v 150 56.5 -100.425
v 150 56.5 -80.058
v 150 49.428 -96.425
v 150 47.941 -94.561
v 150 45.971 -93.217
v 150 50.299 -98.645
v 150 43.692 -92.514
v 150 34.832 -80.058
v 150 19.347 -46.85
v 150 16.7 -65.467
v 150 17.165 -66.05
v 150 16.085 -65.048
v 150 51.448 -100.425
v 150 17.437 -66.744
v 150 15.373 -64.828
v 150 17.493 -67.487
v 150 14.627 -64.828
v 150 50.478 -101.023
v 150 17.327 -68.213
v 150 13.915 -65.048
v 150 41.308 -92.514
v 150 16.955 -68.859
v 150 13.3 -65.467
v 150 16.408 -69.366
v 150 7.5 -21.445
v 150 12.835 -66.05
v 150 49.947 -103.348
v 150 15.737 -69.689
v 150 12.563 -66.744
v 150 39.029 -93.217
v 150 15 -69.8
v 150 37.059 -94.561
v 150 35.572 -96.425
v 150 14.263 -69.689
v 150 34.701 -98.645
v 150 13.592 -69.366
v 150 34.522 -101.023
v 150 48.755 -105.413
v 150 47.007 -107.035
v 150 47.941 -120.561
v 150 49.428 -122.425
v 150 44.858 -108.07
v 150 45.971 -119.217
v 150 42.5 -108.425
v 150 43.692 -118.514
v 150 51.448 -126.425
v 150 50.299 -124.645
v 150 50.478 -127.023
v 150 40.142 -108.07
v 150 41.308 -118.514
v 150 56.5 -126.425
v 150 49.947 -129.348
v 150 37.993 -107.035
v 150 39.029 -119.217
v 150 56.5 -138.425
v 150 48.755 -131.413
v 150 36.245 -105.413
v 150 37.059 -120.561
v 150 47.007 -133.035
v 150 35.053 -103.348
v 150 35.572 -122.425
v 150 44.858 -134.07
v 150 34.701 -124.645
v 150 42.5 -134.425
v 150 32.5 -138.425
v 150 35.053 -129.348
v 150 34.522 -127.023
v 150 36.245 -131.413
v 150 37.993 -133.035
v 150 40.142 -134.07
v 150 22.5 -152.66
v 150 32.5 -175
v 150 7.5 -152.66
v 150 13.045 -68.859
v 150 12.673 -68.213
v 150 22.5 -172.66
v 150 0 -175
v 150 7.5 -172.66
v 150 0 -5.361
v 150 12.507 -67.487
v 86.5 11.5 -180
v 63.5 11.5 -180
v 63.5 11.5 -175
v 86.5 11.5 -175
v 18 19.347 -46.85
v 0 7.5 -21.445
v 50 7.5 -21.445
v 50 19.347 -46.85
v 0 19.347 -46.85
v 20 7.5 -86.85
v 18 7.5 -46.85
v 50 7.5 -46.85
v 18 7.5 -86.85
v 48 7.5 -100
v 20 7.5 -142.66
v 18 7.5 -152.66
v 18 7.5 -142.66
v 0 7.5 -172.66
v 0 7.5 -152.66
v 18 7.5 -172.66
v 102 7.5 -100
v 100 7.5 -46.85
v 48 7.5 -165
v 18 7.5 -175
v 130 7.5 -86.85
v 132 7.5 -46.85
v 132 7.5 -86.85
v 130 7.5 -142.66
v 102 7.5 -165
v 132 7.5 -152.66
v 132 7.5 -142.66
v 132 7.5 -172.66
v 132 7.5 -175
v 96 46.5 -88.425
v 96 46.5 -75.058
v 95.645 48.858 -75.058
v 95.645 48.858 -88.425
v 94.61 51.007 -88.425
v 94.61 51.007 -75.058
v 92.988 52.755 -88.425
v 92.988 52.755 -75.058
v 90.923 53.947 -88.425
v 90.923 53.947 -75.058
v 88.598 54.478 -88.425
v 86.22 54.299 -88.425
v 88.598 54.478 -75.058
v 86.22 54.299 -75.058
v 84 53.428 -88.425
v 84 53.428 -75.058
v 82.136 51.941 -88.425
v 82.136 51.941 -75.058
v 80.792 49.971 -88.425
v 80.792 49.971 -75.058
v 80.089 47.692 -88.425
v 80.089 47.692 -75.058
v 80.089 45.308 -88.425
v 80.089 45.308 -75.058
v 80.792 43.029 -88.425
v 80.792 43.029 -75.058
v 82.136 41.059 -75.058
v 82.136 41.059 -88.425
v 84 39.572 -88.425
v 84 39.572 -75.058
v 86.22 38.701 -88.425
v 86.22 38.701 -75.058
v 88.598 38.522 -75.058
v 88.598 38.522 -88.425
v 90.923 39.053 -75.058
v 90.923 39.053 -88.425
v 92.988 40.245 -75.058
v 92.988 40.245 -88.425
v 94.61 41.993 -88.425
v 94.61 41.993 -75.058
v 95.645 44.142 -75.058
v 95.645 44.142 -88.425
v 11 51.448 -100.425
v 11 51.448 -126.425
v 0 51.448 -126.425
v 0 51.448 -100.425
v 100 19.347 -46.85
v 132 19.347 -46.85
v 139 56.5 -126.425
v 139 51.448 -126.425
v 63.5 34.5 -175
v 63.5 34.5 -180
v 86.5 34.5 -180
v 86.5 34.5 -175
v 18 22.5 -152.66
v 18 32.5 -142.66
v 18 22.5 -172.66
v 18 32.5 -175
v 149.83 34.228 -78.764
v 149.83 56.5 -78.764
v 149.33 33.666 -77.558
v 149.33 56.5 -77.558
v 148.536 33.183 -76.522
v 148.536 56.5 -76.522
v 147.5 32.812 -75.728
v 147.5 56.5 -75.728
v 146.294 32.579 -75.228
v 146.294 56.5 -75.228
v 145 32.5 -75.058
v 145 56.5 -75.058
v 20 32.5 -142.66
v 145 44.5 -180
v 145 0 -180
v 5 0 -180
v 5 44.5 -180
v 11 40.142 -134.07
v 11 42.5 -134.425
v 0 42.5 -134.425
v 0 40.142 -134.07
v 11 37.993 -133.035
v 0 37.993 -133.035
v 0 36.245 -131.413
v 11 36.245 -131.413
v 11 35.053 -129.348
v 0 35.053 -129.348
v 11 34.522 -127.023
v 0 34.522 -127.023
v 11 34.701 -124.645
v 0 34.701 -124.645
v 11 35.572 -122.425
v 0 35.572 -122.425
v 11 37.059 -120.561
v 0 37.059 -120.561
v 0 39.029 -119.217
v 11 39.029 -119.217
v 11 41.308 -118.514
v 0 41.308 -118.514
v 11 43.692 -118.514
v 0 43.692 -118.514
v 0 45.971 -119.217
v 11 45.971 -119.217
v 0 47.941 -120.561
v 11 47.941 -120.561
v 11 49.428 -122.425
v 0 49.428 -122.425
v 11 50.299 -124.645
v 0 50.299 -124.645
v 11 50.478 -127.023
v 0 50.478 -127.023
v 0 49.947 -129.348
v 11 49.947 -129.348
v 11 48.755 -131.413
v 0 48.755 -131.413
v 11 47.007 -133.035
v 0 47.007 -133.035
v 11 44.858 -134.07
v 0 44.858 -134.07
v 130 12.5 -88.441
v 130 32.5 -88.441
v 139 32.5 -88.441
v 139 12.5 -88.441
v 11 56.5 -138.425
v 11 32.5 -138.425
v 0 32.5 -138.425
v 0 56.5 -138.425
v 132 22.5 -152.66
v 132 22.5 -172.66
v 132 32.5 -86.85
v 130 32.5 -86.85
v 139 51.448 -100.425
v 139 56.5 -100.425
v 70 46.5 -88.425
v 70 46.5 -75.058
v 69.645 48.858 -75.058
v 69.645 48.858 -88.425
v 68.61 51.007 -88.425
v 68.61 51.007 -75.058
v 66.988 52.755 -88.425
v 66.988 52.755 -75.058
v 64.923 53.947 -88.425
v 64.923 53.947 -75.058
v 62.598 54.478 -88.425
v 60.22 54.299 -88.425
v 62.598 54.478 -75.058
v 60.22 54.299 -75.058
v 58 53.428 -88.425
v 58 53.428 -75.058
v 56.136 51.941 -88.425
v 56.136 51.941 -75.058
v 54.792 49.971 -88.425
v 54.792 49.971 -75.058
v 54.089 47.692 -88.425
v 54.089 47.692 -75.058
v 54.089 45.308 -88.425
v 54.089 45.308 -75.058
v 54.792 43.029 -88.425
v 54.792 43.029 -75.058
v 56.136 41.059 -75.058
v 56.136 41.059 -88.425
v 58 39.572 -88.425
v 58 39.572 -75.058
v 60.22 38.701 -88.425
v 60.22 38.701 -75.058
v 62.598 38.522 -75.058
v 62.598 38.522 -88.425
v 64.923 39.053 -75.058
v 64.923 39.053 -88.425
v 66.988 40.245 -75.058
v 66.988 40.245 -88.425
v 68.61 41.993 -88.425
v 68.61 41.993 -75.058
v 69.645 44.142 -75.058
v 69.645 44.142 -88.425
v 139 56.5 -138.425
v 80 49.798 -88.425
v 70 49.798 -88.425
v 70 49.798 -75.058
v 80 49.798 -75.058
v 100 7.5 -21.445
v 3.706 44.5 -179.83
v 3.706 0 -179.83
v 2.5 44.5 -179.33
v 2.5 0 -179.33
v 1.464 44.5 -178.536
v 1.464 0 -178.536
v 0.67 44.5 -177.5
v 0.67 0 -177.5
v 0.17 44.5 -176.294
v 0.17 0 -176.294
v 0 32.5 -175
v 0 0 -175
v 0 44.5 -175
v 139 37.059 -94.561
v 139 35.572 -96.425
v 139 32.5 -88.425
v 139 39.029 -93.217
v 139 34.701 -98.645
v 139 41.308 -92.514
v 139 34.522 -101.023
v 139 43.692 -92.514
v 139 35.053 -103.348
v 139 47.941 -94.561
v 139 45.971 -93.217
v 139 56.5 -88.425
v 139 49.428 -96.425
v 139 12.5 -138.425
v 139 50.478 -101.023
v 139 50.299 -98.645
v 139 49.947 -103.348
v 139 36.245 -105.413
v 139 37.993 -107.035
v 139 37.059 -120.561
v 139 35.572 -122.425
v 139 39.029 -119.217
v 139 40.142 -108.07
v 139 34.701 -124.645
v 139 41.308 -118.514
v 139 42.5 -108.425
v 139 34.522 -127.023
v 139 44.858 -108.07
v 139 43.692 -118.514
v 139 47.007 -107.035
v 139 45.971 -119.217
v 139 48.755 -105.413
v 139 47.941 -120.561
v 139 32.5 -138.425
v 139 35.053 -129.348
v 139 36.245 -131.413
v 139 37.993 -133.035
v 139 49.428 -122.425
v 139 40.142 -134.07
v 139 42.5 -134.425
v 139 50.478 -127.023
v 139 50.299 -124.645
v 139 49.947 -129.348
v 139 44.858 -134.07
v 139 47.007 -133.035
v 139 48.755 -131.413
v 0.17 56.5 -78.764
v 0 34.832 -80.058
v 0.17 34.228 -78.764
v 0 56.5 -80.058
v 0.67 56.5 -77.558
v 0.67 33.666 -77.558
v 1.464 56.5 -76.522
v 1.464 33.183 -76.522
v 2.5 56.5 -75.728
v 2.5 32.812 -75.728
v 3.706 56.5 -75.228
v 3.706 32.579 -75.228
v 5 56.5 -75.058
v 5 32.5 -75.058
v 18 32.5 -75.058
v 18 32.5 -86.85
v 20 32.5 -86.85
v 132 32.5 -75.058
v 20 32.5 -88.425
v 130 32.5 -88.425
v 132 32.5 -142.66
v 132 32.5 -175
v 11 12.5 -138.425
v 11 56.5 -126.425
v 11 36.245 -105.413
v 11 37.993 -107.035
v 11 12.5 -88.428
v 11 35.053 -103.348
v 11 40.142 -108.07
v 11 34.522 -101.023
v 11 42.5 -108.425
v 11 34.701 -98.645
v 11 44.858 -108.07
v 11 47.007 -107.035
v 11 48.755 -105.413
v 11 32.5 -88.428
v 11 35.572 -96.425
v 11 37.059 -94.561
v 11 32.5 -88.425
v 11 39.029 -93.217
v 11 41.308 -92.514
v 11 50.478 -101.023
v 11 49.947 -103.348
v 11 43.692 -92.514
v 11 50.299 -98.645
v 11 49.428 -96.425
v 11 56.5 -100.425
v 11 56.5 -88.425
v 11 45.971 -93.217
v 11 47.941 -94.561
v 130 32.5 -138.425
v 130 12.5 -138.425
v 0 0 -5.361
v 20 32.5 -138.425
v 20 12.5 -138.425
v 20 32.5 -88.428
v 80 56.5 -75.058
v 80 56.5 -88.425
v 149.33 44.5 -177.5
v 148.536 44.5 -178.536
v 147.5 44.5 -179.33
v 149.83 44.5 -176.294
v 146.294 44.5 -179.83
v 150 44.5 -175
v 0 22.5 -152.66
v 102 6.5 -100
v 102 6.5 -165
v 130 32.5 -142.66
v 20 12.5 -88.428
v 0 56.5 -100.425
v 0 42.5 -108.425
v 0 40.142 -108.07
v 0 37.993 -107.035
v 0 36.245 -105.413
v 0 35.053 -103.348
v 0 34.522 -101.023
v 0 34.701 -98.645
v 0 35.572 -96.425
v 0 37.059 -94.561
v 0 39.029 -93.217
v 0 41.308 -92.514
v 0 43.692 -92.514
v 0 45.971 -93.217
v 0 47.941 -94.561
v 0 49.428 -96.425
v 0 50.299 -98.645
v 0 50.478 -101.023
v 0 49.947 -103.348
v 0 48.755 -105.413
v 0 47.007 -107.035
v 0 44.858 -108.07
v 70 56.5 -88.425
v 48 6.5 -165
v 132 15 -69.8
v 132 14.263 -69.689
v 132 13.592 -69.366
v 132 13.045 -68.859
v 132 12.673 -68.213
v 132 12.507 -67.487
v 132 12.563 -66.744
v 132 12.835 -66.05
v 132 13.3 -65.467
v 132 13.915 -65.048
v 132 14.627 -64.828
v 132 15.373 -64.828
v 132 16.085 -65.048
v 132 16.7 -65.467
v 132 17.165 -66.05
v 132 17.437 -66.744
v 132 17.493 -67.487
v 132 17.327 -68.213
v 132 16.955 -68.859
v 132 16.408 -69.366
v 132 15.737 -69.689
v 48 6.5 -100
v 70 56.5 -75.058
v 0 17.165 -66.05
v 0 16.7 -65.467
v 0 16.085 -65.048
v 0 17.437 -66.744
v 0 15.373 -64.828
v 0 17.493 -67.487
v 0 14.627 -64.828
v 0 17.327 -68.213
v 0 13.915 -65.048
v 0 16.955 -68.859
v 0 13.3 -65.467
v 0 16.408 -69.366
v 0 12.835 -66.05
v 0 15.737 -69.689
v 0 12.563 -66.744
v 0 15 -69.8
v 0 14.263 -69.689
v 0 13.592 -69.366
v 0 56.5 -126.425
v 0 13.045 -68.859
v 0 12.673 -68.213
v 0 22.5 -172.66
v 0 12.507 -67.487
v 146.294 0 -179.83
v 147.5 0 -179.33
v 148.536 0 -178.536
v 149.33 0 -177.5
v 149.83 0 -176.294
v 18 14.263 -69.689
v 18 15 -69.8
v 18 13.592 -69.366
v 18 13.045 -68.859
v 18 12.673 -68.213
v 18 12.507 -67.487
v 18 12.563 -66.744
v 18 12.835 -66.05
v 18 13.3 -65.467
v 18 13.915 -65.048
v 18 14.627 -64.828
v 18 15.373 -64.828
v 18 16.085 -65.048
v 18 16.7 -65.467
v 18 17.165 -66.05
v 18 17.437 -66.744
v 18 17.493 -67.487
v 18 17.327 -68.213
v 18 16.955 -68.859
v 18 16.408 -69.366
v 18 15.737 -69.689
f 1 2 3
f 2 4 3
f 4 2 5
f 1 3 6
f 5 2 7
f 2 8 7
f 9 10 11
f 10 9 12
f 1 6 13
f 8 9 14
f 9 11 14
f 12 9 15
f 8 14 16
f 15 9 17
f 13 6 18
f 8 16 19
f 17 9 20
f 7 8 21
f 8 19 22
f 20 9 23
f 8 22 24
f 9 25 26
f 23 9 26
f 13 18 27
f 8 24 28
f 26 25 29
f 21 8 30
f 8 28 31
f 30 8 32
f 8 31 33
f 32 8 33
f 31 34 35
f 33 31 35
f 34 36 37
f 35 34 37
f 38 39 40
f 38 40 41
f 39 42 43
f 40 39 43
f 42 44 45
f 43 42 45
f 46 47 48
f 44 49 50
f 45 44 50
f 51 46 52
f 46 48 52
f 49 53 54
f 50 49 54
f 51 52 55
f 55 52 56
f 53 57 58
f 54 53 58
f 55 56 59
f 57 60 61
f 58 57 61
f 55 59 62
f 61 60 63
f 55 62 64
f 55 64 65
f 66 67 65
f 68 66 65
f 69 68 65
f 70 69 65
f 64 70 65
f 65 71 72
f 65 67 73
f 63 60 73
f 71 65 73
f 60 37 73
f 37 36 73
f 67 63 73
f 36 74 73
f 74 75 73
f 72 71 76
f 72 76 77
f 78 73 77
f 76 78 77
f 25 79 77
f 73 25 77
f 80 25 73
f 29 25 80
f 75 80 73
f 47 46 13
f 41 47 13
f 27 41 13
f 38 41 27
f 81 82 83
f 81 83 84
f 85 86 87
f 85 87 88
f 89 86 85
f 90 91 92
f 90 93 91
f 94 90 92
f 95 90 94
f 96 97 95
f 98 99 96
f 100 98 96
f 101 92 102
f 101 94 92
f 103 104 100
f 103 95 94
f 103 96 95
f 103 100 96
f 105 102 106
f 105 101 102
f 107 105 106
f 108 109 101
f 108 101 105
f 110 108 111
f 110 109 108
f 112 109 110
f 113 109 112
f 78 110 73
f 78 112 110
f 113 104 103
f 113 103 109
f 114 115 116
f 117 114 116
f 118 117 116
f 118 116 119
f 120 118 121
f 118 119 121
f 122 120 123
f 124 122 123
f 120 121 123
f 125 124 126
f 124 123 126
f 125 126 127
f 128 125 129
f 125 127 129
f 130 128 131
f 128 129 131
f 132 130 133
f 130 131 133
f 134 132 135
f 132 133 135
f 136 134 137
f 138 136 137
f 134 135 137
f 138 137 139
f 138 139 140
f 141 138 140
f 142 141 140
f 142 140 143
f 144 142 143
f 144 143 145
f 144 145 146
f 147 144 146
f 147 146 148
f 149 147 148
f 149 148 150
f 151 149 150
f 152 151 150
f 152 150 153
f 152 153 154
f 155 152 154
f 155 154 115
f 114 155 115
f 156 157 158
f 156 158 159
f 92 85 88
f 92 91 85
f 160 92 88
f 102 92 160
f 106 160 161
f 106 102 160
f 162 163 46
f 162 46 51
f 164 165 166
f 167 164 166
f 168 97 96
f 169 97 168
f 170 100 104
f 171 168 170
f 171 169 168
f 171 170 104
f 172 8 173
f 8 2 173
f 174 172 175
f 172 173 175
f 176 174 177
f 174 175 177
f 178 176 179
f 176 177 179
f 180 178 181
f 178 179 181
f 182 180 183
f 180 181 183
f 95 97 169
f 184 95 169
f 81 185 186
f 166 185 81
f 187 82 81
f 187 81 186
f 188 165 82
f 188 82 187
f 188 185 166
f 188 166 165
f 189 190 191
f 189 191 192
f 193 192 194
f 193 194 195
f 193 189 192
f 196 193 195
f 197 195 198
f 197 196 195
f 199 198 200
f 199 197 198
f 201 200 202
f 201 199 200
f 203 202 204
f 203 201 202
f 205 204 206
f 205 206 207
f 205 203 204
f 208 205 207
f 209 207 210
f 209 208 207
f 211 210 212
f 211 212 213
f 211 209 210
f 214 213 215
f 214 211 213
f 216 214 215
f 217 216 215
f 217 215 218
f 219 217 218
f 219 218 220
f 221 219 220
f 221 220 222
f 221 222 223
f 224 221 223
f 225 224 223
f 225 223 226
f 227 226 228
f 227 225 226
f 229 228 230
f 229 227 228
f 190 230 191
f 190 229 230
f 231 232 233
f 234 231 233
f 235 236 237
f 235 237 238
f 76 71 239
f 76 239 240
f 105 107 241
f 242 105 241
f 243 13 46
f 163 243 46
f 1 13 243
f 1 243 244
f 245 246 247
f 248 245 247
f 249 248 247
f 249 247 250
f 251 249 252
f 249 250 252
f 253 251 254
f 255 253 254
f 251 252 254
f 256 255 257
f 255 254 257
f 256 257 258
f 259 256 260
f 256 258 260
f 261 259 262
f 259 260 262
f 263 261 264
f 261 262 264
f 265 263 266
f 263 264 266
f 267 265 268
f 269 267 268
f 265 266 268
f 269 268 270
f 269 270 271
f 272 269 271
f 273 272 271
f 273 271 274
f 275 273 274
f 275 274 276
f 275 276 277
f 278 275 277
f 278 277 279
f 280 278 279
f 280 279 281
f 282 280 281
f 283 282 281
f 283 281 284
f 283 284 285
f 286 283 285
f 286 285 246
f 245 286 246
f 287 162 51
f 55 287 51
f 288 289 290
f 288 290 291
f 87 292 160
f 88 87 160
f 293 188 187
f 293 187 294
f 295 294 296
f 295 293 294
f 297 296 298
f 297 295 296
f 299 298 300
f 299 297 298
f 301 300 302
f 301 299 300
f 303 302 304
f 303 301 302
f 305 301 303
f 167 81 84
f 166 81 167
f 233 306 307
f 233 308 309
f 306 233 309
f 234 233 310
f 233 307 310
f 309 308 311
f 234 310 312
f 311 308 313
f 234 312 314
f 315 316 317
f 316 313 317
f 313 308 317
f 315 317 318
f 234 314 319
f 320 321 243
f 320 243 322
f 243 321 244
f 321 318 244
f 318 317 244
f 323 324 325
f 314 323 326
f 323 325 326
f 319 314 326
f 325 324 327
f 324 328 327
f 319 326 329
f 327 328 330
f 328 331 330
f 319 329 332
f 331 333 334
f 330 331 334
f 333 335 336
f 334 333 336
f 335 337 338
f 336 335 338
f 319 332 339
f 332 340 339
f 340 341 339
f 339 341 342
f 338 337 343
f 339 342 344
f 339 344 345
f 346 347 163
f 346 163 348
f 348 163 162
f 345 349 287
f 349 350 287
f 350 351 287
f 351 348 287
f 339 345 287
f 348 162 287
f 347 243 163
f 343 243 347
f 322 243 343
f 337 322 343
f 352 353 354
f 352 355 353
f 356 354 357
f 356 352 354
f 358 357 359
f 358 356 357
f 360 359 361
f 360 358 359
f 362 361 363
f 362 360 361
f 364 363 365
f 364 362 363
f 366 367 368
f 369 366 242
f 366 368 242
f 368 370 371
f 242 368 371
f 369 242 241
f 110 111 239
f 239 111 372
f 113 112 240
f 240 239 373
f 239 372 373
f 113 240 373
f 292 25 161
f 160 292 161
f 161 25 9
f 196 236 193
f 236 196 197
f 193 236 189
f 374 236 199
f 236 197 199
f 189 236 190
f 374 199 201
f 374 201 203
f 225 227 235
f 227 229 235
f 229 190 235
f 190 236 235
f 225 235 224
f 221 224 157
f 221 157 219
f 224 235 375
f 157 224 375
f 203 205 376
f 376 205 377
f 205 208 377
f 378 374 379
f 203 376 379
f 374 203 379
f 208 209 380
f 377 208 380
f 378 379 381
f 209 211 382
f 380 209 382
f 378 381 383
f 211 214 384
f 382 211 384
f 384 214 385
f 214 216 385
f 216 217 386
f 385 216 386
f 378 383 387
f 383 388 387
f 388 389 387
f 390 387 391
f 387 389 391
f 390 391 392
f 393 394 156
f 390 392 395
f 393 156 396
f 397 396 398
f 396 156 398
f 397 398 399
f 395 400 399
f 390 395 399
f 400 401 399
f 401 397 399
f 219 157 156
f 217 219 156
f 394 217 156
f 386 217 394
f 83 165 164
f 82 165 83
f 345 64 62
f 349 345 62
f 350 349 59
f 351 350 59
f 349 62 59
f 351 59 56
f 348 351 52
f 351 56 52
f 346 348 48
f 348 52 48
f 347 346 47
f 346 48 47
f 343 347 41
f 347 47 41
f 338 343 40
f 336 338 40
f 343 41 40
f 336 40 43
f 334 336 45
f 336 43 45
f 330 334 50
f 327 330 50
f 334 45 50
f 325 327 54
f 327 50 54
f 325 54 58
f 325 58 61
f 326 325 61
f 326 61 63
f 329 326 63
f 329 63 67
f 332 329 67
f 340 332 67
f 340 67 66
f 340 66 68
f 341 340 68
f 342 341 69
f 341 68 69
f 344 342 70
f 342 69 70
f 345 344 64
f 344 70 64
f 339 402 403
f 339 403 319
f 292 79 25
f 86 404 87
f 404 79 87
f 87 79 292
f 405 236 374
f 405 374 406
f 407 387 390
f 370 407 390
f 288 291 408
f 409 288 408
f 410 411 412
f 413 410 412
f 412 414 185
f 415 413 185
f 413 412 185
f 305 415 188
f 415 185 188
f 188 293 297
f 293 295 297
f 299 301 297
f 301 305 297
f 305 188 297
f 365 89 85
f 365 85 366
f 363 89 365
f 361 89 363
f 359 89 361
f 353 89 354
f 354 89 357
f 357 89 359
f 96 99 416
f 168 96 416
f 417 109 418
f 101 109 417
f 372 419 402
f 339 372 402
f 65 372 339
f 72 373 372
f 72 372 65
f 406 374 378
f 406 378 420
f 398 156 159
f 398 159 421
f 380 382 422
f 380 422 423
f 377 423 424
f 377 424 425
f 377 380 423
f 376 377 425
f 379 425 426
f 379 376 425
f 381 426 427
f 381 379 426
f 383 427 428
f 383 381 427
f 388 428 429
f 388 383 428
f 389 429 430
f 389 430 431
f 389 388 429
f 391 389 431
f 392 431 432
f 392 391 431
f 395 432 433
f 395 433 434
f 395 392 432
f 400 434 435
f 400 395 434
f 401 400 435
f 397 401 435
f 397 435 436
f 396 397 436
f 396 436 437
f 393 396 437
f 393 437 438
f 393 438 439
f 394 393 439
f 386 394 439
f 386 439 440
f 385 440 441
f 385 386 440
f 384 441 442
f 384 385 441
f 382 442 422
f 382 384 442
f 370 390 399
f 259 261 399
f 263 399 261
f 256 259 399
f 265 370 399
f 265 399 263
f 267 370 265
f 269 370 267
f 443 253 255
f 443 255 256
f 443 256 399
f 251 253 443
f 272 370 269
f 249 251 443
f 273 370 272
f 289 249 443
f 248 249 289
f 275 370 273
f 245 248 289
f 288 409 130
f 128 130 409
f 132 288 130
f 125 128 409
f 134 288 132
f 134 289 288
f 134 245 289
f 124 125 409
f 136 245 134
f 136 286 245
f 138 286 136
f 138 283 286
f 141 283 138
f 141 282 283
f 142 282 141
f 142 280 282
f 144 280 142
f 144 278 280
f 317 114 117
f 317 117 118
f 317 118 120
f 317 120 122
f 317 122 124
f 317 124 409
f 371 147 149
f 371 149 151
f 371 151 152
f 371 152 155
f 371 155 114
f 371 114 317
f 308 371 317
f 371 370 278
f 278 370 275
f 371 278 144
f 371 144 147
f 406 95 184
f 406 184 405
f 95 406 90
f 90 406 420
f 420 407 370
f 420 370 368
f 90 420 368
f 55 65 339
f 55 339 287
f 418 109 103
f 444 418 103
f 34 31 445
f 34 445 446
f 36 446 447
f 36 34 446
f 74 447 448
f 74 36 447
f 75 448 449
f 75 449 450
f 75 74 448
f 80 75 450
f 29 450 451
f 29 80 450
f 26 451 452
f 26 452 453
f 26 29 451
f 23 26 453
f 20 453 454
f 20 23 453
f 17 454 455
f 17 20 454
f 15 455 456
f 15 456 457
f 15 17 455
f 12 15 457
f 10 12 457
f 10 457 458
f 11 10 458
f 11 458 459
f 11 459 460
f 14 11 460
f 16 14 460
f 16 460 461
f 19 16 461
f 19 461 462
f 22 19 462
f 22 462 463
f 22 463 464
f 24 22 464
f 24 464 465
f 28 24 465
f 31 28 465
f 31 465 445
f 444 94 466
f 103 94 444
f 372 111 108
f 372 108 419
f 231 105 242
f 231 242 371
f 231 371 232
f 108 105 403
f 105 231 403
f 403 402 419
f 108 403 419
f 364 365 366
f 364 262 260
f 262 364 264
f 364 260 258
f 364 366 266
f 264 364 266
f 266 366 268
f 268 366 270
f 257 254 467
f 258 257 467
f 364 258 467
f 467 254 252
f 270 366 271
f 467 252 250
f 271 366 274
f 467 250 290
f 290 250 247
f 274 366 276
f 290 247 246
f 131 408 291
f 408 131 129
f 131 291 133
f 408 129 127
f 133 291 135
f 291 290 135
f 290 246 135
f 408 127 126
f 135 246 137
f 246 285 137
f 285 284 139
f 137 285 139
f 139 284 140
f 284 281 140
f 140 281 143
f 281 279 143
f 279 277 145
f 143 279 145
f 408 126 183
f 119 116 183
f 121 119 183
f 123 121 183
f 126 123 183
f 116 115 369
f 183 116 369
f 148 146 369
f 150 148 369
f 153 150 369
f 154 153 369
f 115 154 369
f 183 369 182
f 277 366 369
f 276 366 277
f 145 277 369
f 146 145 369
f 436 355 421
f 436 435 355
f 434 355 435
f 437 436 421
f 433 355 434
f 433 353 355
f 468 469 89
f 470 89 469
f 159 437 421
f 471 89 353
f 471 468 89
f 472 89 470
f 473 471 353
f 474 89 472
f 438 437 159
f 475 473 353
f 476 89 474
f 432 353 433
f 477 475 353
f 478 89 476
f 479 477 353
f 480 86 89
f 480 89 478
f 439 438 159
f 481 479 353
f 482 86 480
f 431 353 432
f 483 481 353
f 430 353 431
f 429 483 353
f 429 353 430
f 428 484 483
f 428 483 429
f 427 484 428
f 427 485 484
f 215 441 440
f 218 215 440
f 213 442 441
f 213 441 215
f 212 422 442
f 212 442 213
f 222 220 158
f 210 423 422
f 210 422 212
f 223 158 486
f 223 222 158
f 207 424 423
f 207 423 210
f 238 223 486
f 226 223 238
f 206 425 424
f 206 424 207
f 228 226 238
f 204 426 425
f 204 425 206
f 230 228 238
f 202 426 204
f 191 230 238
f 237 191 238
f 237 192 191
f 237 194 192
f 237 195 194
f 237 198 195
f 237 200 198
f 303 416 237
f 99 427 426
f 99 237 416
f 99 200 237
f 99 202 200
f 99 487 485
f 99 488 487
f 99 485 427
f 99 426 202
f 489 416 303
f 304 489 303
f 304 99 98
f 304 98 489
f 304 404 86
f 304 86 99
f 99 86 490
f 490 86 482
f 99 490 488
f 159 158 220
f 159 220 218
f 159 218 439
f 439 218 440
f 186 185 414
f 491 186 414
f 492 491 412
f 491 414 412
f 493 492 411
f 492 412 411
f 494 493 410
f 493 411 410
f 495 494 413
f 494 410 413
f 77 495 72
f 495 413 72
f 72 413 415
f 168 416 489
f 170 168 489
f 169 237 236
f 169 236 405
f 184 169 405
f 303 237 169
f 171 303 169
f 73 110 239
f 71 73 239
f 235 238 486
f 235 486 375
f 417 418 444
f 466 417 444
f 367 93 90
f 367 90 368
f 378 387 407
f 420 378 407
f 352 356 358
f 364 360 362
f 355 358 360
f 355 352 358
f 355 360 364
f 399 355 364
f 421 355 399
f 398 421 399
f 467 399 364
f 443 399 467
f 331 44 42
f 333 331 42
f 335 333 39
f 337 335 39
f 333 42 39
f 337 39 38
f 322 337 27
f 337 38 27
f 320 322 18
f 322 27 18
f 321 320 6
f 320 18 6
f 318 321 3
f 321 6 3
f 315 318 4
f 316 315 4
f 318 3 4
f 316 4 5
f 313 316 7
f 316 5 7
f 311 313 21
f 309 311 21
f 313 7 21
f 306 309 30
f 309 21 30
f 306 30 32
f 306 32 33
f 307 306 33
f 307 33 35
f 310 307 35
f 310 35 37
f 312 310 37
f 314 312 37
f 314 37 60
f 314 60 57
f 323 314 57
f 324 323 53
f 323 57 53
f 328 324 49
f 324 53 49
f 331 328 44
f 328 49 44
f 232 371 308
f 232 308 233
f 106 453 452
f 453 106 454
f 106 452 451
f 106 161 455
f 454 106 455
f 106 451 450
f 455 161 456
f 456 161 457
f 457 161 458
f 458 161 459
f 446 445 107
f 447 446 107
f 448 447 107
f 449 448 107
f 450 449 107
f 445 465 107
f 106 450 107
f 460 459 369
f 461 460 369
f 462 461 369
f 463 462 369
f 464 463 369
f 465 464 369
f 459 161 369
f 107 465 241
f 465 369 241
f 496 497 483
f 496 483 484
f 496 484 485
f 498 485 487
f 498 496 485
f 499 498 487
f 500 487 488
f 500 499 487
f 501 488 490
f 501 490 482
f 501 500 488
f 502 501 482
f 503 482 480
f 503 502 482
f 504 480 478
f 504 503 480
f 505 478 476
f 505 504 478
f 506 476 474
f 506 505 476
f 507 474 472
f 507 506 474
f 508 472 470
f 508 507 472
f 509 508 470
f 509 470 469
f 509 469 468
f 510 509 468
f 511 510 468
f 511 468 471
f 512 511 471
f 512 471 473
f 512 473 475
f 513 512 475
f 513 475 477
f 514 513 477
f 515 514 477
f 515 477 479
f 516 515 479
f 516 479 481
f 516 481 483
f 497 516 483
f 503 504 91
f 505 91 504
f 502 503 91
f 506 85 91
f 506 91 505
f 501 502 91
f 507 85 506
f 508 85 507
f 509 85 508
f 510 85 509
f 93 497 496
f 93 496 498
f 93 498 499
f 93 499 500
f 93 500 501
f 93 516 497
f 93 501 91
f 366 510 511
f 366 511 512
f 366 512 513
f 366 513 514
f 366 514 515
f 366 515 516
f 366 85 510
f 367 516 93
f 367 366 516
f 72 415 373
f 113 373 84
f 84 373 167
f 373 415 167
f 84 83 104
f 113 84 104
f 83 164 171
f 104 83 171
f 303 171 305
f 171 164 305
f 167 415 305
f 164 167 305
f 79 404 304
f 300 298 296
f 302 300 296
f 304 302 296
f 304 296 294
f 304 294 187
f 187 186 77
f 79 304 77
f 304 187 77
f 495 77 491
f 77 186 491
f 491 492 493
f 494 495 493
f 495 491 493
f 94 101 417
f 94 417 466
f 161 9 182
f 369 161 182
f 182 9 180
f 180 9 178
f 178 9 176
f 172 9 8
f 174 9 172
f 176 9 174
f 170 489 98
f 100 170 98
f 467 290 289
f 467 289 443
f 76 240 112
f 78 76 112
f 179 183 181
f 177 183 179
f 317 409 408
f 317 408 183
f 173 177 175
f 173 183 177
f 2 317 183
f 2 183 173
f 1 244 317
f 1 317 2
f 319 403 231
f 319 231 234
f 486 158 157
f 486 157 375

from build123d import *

# Parameters (mm, degrees)
SKETCH1_W                = 150
SKETCH1_H                = 180
BOSS_EXTRUDE2_DEPTH      = 7.5
BOSS_EXTRUDE4_DEPTH      = 18
BOSS_EXTRUDE5_DEPTH      = 18
SKETCH6_W                = 20
SKETCH6_H                = 15
BOSS_EXTRUDE7_DEPTH      = 18
BOSS_EXTRUDE8_DEPTH      = 22
BOSS_EXTRUDE8_DEPTH_BACK = 172
SKETCH7_R                = 2.5
SKETCH8_W                = 20
SKETCH8_H                = 15
BOSS_EXTRUDE9_DEPTH      = 18
SKETCH9_W                = 55.809879822
SKETCH9_H                = 25
BOSS_EXTRUDE10_DEPTH     = 20
SKETCH10_W               = 55.809879822
SKETCH10_H               = 25
BOSS_EXTRUDE11_DEPTH     = 20
CHAMFER2_SIZE            = 10
CHAMFER2_SIZE_2          = 21.445069205
SKETCH12_R               = 8
BOSS_EXTRUDE12_DEPTH     = 11
SKETCH13_W               = 50
SKETCH13_H               = 2
BOSS_EXTRUDE13_DEPTH     = 11
SKETCH14_W               = 26
SKETCH14_H               = 4.425411463
CUT_EXTRUDE1_DEPTH       = 11
SKETCH15_W               = 9
SKETCH15_H               = 49.984045424
CUT_EXTRUDE2_DEPTH       = 20
BOSS_EXTRUDE14_START     = -11
SKETCH16_W               = 50
SKETCH16_H               = 24
SKETCH16_R               = 8
SKETCH16_W_2             = 26
SKETCH16_H_2             = 4.425411463
BOSS_EXTRUDE14_DEPTH     = 11
SKETCH17_W               = 9
SKETCH17_H               = 49.996535525
CUT_EXTRUDE3_DEPTH       = 20
SKETCH20_W               = 114
SKETCH20_H               = 5
BOSS_EXTRUDE15_DEPTH     = 25
CUT_EXTRUDE4_DEPTH       = 1
CUT_EXTRUDE5_DEPTH       = 20
BOSS_EXTRUDE16_DEPTH     = 50
CUT_EXTRUDE6_DEPTH       = 50
BOSS_EXTRUDE17_DEPTH     = 50
SKETCH27_W               = 150
SKETCH27_H               = 12
BOSS_EXTRUDE18_DEPTH     = 5
CUT_EXTRUDE7_DEPTH       = 5
SKETCH29_W               = 150
SKETCH29_H               = 13.367257782
BOSS_EXTRUDE19_DEPTH     = 24
SKETCH30_W               = 50
SKETCH30_H               = 25.404930795
BOSS_EXTRUDE20_DEPTH     = 12
CUT_EXTRUDE10_DEPTH      = 50
SKETCH32_R               = 8
CUT_EXTRUDE13_DEPTH      = 50
SKETCH33_W               = 10
SKETCH33_H               = 6.701665097
CUT_EXTRUDE14_DEPTH      = 50
FILLET1_R                = 5
FILLET2_R                = 5
FILLET3_R                = 5
FILLET4_R                = 5
CUT_EXTRUDE15_START      = -200
SKETCH34_R               = 2.5
CUT_EXTRUDE15_DEPTH      = 200
CUT_EXTRUDE16_DEPTH      = 200
CUT_EXTRUDE17_DEPTH      = 200


with BuildPart() as part:
    # Sketch1 → Boss-Extrude2 (new body)
    with BuildSketch(Plane(origin=(0, 0, 0), x_dir=(1, 0, 0), z_dir=(0, 1, 0))):
        with Locations((75, 90)):
            Rectangle(SKETCH1_W, SKETCH1_H)
    extrude(amount=BOSS_EXTRUDE2_DEPTH)

    # Sketch2 → Boss-Extrude4 (add)
    with BuildSketch(Plane(origin=(150, 0, 0), x_dir=(0, 0, -1), z_dir=(1, 0, 0))):
        Polygon((76.85, 7.5), (86.85, 7.5), (86.85, 32.5), (46.85, 32.5), (46.85, 7.5), (50, 7.5), (56.85, 7.5), (56.85, 22.5), (76.85, 22.5), align=None)
        Polygon((172.659879822, 7.5), (180, 7.5), (180, 32.5), (142.659879822, 32.5), (142.659879822, 7.5), (152.659879822, 7.5), (152.659879822, 22.5), (172.659879822, 22.5), align=None)
    extrude(amount=-BOSS_EXTRUDE4_DEPTH)

    # Sketch4 → Boss-Extrude5 (add)
    with BuildSketch(Plane.ZY):
        Polygon((-180, 7.5), (-180, 32.5), (-142.659879822, 32.5), (-142.659879822, 7.5), (-152.659879822, 7.5), (-152.659879822, 22.5), (-172.659879822, 22.5), (-172.659879822, 7.5), align=None)
        Polygon((-86.85, 7.5), (-86.85, 32.5), (-46.85, 32.5), (-46.85, 7.5), (-56.85, 7.5), (-56.85, 22.5), (-76.85, 22.5), (-76.85, 7.5), align=None)
    extrude(amount=-BOSS_EXTRUDE5_DEPTH)

    # Sketch6 → Boss-Extrude7 (add)
    with BuildSketch(Plane(origin=(150, 0, 0), x_dir=(0, 0, -1), z_dir=(1, 0, 0))):
        with Locations((66.85, 15)):
            Rectangle(SKETCH6_W, SKETCH6_H)
    extrude(amount=-BOSS_EXTRUDE7_DEPTH)

    # Sketch7 → Boss-Extrude8 (add, two sides: drawn at the far end of the back side and taken through both)
    with BuildSketch(Plane(origin=(150, 0, 0), x_dir=(0, 0, -1), z_dir=(1, 0, 0)).offset(-BOSS_EXTRUDE8_DEPTH_BACK)):
        with Locations((67.3, 15)):
            Circle(SKETCH7_R)
    extrude(amount=BOSS_EXTRUDE8_DEPTH + BOSS_EXTRUDE8_DEPTH_BACK)

    # Sketch8 → Boss-Extrude9 (add)
    with BuildSketch(Plane.ZY):
        with Locations((-66.85, 15)):
            Rectangle(SKETCH8_W, SKETCH8_H)
    extrude(amount=-BOSS_EXTRUDE9_DEPTH)

    # Sketch9 → Boss-Extrude10 (add)
    with BuildSketch(Plane(origin=(150, 0, 0), x_dir=(0, 0, -1), z_dir=(1, 0, 0))):
        with Locations((114.754939911, 20)):
            Rectangle(SKETCH9_W, SKETCH9_H)
    extrude(amount=-BOSS_EXTRUDE10_DEPTH)

    # Sketch10 → Boss-Extrude11 (add)
    with BuildSketch(Plane.ZY):
        with Locations((-114.754939911, 20)):
            Rectangle(SKETCH10_W, SKETCH10_H)
    extrude(amount=-BOSS_EXTRUDE11_DEPTH)

    # Chamfer2
    # the kernel refuses this chamfer: 21.445069205, 10 mm, written as the material it takes off along each edge
    with BuildSketch(Plane(origin=(-55.563648293, 7.5, 0), x_dir=(0, -0.9971975577536774, 0.07481330637060031), z_dir=(1, 0, 0))) as chamfer2_piece_1:
        Polygon((CHAMFER2_SIZE * 0.997197557754, CHAMFER2_SIZE * 0.0748133063706), (-CHAMFER2_SIZE_2 * 0.0748133063709, CHAMFER2_SIZE_2 * 0.997197557758), (0, 0), align=None)
    extrude(amount=261.127296587, mode=Mode.SUBTRACT)

    # Sketch12 → Boss-Extrude12 (add)
    with BuildSketch(Plane(origin=(150, 0, 0), x_dir=(0, 0, -1), z_dir=(1, 0, 0))):
        Polygon((100.425, 32.5), (113.425, 32.5), (126.425, 32.5), (138.425, 32.5), (138.425, 42.5), (138.425, 54.5), (88.425, 54.5), (88.425, 42.5), (88.425, 32.5), align=None)
        with Locations((100.425, 42.5)):
            Circle(SKETCH12_R, mode=Mode.SUBTRACT)
        with Locations((126.425, 42.5)):
            Circle(SKETCH12_R, mode=Mode.SUBTRACT)
    extrude(amount=-BOSS_EXTRUDE12_DEPTH)

    # Sketch13 → Boss-Extrude13 (add)
    with BuildSketch(Plane(origin=(150, 0, 0), x_dir=(0, 0, -1), z_dir=(1, 0, 0))):
        with Locations((113.425, 55.5)):
            Rectangle(SKETCH13_W, SKETCH13_H)
    extrude(amount=-BOSS_EXTRUDE13_DEPTH)

    # Sketch14 → Cut-Extrude1 (cut)
    with BuildSketch(Plane(origin=(150, 0, 0), x_dir=(0, 0, -1), z_dir=(1, 0, 0))):
        with Locations((113.425, 53.660783617)):
            Rectangle(SKETCH14_W, SKETCH14_H)
    extrude(amount=-CUT_EXTRUDE1_DEPTH, mode=Mode.SUBTRACT)

    # Sketch15 → Cut-Extrude2 (cut)
    with BuildSketch(Plane(origin=(0, 32.5, 0), x_dir=(1, 0, 0), z_dir=(0, 1, 0))):
        with Locations((134.5, 113.432977288)):
            Rectangle(SKETCH15_W, SKETCH15_H)
    extrude(amount=-CUT_EXTRUDE2_DEPTH, mode=Mode.SUBTRACT)

    # Sketch16 → Boss-Extrude14 (add)
    with BuildSketch(Plane.ZY.offset(BOSS_EXTRUDE14_START)):
        with Locations((-113.425, 44.5)):
            Rectangle(SKETCH16_W, SKETCH16_H)
        with Locations(Location((-126.425, 42.5, 0), (0, 0, 180))):
            Circle(SKETCH16_R, mode=Mode.SUBTRACT)
        with Locations(Location((-100.425, 42.5, 0), (0, 0, 180))):
            Circle(SKETCH16_R, mode=Mode.SUBTRACT)
        with Locations((-113.425, 53.660783617)):
            Rectangle(SKETCH16_W_2, SKETCH16_H_2, mode=Mode.SUBTRACT)
    extrude(amount=BOSS_EXTRUDE14_DEPTH)

    # Sketch17 → Cut-Extrude3 (cut)
    with BuildSketch(Plane(origin=(0, 32.5, 0), x_dir=(1, 0, 0), z_dir=(0, 1, 0))):
        with Locations((15.5, 113.426732238)):
            Rectangle(SKETCH17_W, SKETCH17_H)
    extrude(amount=-CUT_EXTRUDE3_DEPTH, mode=Mode.SUBTRACT)

    # Sketch20 → Boss-Extrude15 (add)
    with BuildSketch(Plane(origin=(0, 7.5, 0), x_dir=(1, 0, 0), z_dir=(0, 1, 0))):
        with Locations((75, 177.5)):
            Rectangle(SKETCH20_W, SKETCH20_H)
    extrude(amount=BOSS_EXTRUDE15_DEPTH)

    # Sketch21 → Cut-Extrude4 (cut)
    with BuildSketch(Plane(origin=(0, 7.5, 0), x_dir=(1, 0, 0), z_dir=(0, 1, 0))):
        Polygon((48, 165), (75, 165), (102, 165), (102, 100), (48, 100), align=None)
    extrude(amount=-CUT_EXTRUDE4_DEPTH, mode=Mode.SUBTRACT)

    # Sketch22 → Cut-Extrude5 (cut)
    with BuildSketch(Plane(origin=(150, 0, 0), x_dir=(0, 0, -1), z_dir=(1, 0, 0))):
        Polygon((21.445069205, 7.5), (46.85, 19.346513785), (75.057742218, 32.5), (21.445069205, 32.5), align=None)
    extrude(amount=-CUT_EXTRUDE5_DEPTH, mode=Mode.SUBTRACT)

    # Sketch23 → Boss-Extrude16 (add)
    with BuildSketch(Plane(origin=(150, 0, 0), x_dir=(0, 0, -1), z_dir=(1, 0, 0))):
        Polygon((21.445069205, 7.5), (46.85, 19.346513785), (46.85, 7.5), align=None)
    extrude(amount=-BOSS_EXTRUDE16_DEPTH)

    # Sketch24 → Cut-Extrude6 (cut)
    with BuildSketch(Plane.ZY):
        Polygon((-21.445069205, 7.5), (-75.057742218, 32.5), (-21.445069205, 32.5), align=None)
    extrude(amount=-CUT_EXTRUDE6_DEPTH, mode=Mode.SUBTRACT)

    # Sketch25 → Boss-Extrude17 (add)
    with BuildSketch(Plane.ZY):
        Polygon((-46.85, 19.346513785), (-46.85, 7.5), (-21.445069205, 7.5), align=None)
    extrude(amount=-BOSS_EXTRUDE17_DEPTH)

    # Sketch27 → Boss-Extrude18 (add)
    with BuildSketch(Plane(origin=(0, 0, -180), x_dir=(-1, 0, 0), z_dir=(0, 0, -1))):
        with Locations((-75, 38.5)):
            Rectangle(SKETCH27_W, SKETCH27_H)
    extrude(amount=-BOSS_EXTRUDE18_DEPTH)

    # Sketch28 → Cut-Extrude7 (cut)
    with BuildSketch(Plane(origin=(0, 0, -180), x_dir=(-1, 0, 0), z_dir=(0, 0, -1))):
        Polygon((-75, 34.5), (-63.5, 34.5), (-63.5, 11.5), (-86.5, 11.5), (-86.5, 34.5), align=None)
    extrude(amount=-CUT_EXTRUDE7_DEPTH, mode=Mode.SUBTRACT)

    # Sketch29 → Boss-Extrude19 (add)
    with BuildSketch(Plane(origin=(0, 32.5, 0), x_dir=(1, 0, 0), z_dir=(0, 1, 0))):
        with Locations((75, 81.741371109)):
            Rectangle(SKETCH29_W, SKETCH29_H)
    extrude(amount=BOSS_EXTRUDE19_DEPTH)

    # Sketch30 → Boss-Extrude20 (add)
    with BuildSketch(Plane(origin=(0, 7.5, 0), x_dir=(1, 0, 0), z_dir=(0, 1, 0))):
        with Locations((75, 34.147534603)):
            Rectangle(SKETCH30_W, SKETCH30_H)
    extrude(amount=BOSS_EXTRUDE20_DEPTH)

    # Sketch31 → Cut-Extrude10 (cut)
    with BuildSketch(Plane(origin=(100, 0, 0), x_dir=(0, 0, -1), z_dir=(1, 0, 0))):
        Polygon((48.364168982, 20.052582377), (21.328861381, 20.052582377), (21.445069205, 7.5), align=None)
    extrude(amount=-CUT_EXTRUDE10_DEPTH, mode=Mode.SUBTRACT)

    # Sketch32 → Cut-Extrude13 (cut)
    with BuildSketch(Plane.XY.offset(-75.057742218)):
        with Locations((62, 46.5)):
            Circle(SKETCH32_R)
        with Locations((88, 46.5)):
            Circle(SKETCH32_R)
    extrude(amount=-CUT_EXTRUDE13_DEPTH, mode=Mode.SUBTRACT)

    # Sketch33 → Cut-Extrude14 (cut)
    with BuildSketch(Plane.XY.offset(-75.057742218)):
        with Locations((75, 53.149167452)):
            Rectangle(SKETCH33_W, SKETCH33_H)
    extrude(amount=-CUT_EXTRUDE14_DEPTH, mode=Mode.SUBTRACT)

    # Fillet1
    fillet1_edges = [part.edges().sort_by_distance(p)[0] for p in [
        (0, 44.5, -75.057742218),
    ]]
    fillet(fillet1_edges, radius=FILLET1_R)

    # Fillet2
    fillet2_edges = [part.edges().sort_by_distance(p)[0] for p in [
        (150, 44.5, -75.057742218),
    ]]
    fillet(fillet2_edges, radius=FILLET2_R)

    # Fillet3
    fillet3_edges = [part.edges().sort_by_distance(p)[0] for p in [
        (150, 22.25, -180),
    ]]
    fillet(fillet3_edges, radius=FILLET3_R)

    # Fillet4
    fillet4_edges = [part.edges().sort_by_distance(p)[0] for p in [
        (0, 22.25, -180),
    ]]
    fillet(fillet4_edges, radius=FILLET4_R)

    # Sketch34 → Cut-Extrude15 (cut)
    with BuildSketch(Plane.ZY.offset(22).offset(CUT_EXTRUDE15_START)):
        with Locations(Location((-67.3, 15, 0), (0, 0, 180))):
            Circle(SKETCH34_R)
    extrude(amount=CUT_EXTRUDE15_DEPTH, mode=Mode.SUBTRACT)

    # Sketch35 → Cut-Extrude16 (cut)
    with BuildSketch(Plane.ZY):
        Polygon((-126.425, 55.873489348), (-126.425, 56.5), (-100.505365538, 56.5), (-100.425, 55.873489348), align=None)
    extrude(amount=-CUT_EXTRUDE16_DEPTH, mode=Mode.SUBTRACT)

    # Sketch36 → Cut-Extrude17 (cut)
    with BuildSketch(Plane.ZY):
        Polygon((-100.425, 55.873489348), (-100.425, 56.5), (-100.505365538, 56.5), align=None)
    extrude(amount=-CUT_EXTRUDE17_DEPTH, mode=Mode.SUBTRACT)


solid = part.part
